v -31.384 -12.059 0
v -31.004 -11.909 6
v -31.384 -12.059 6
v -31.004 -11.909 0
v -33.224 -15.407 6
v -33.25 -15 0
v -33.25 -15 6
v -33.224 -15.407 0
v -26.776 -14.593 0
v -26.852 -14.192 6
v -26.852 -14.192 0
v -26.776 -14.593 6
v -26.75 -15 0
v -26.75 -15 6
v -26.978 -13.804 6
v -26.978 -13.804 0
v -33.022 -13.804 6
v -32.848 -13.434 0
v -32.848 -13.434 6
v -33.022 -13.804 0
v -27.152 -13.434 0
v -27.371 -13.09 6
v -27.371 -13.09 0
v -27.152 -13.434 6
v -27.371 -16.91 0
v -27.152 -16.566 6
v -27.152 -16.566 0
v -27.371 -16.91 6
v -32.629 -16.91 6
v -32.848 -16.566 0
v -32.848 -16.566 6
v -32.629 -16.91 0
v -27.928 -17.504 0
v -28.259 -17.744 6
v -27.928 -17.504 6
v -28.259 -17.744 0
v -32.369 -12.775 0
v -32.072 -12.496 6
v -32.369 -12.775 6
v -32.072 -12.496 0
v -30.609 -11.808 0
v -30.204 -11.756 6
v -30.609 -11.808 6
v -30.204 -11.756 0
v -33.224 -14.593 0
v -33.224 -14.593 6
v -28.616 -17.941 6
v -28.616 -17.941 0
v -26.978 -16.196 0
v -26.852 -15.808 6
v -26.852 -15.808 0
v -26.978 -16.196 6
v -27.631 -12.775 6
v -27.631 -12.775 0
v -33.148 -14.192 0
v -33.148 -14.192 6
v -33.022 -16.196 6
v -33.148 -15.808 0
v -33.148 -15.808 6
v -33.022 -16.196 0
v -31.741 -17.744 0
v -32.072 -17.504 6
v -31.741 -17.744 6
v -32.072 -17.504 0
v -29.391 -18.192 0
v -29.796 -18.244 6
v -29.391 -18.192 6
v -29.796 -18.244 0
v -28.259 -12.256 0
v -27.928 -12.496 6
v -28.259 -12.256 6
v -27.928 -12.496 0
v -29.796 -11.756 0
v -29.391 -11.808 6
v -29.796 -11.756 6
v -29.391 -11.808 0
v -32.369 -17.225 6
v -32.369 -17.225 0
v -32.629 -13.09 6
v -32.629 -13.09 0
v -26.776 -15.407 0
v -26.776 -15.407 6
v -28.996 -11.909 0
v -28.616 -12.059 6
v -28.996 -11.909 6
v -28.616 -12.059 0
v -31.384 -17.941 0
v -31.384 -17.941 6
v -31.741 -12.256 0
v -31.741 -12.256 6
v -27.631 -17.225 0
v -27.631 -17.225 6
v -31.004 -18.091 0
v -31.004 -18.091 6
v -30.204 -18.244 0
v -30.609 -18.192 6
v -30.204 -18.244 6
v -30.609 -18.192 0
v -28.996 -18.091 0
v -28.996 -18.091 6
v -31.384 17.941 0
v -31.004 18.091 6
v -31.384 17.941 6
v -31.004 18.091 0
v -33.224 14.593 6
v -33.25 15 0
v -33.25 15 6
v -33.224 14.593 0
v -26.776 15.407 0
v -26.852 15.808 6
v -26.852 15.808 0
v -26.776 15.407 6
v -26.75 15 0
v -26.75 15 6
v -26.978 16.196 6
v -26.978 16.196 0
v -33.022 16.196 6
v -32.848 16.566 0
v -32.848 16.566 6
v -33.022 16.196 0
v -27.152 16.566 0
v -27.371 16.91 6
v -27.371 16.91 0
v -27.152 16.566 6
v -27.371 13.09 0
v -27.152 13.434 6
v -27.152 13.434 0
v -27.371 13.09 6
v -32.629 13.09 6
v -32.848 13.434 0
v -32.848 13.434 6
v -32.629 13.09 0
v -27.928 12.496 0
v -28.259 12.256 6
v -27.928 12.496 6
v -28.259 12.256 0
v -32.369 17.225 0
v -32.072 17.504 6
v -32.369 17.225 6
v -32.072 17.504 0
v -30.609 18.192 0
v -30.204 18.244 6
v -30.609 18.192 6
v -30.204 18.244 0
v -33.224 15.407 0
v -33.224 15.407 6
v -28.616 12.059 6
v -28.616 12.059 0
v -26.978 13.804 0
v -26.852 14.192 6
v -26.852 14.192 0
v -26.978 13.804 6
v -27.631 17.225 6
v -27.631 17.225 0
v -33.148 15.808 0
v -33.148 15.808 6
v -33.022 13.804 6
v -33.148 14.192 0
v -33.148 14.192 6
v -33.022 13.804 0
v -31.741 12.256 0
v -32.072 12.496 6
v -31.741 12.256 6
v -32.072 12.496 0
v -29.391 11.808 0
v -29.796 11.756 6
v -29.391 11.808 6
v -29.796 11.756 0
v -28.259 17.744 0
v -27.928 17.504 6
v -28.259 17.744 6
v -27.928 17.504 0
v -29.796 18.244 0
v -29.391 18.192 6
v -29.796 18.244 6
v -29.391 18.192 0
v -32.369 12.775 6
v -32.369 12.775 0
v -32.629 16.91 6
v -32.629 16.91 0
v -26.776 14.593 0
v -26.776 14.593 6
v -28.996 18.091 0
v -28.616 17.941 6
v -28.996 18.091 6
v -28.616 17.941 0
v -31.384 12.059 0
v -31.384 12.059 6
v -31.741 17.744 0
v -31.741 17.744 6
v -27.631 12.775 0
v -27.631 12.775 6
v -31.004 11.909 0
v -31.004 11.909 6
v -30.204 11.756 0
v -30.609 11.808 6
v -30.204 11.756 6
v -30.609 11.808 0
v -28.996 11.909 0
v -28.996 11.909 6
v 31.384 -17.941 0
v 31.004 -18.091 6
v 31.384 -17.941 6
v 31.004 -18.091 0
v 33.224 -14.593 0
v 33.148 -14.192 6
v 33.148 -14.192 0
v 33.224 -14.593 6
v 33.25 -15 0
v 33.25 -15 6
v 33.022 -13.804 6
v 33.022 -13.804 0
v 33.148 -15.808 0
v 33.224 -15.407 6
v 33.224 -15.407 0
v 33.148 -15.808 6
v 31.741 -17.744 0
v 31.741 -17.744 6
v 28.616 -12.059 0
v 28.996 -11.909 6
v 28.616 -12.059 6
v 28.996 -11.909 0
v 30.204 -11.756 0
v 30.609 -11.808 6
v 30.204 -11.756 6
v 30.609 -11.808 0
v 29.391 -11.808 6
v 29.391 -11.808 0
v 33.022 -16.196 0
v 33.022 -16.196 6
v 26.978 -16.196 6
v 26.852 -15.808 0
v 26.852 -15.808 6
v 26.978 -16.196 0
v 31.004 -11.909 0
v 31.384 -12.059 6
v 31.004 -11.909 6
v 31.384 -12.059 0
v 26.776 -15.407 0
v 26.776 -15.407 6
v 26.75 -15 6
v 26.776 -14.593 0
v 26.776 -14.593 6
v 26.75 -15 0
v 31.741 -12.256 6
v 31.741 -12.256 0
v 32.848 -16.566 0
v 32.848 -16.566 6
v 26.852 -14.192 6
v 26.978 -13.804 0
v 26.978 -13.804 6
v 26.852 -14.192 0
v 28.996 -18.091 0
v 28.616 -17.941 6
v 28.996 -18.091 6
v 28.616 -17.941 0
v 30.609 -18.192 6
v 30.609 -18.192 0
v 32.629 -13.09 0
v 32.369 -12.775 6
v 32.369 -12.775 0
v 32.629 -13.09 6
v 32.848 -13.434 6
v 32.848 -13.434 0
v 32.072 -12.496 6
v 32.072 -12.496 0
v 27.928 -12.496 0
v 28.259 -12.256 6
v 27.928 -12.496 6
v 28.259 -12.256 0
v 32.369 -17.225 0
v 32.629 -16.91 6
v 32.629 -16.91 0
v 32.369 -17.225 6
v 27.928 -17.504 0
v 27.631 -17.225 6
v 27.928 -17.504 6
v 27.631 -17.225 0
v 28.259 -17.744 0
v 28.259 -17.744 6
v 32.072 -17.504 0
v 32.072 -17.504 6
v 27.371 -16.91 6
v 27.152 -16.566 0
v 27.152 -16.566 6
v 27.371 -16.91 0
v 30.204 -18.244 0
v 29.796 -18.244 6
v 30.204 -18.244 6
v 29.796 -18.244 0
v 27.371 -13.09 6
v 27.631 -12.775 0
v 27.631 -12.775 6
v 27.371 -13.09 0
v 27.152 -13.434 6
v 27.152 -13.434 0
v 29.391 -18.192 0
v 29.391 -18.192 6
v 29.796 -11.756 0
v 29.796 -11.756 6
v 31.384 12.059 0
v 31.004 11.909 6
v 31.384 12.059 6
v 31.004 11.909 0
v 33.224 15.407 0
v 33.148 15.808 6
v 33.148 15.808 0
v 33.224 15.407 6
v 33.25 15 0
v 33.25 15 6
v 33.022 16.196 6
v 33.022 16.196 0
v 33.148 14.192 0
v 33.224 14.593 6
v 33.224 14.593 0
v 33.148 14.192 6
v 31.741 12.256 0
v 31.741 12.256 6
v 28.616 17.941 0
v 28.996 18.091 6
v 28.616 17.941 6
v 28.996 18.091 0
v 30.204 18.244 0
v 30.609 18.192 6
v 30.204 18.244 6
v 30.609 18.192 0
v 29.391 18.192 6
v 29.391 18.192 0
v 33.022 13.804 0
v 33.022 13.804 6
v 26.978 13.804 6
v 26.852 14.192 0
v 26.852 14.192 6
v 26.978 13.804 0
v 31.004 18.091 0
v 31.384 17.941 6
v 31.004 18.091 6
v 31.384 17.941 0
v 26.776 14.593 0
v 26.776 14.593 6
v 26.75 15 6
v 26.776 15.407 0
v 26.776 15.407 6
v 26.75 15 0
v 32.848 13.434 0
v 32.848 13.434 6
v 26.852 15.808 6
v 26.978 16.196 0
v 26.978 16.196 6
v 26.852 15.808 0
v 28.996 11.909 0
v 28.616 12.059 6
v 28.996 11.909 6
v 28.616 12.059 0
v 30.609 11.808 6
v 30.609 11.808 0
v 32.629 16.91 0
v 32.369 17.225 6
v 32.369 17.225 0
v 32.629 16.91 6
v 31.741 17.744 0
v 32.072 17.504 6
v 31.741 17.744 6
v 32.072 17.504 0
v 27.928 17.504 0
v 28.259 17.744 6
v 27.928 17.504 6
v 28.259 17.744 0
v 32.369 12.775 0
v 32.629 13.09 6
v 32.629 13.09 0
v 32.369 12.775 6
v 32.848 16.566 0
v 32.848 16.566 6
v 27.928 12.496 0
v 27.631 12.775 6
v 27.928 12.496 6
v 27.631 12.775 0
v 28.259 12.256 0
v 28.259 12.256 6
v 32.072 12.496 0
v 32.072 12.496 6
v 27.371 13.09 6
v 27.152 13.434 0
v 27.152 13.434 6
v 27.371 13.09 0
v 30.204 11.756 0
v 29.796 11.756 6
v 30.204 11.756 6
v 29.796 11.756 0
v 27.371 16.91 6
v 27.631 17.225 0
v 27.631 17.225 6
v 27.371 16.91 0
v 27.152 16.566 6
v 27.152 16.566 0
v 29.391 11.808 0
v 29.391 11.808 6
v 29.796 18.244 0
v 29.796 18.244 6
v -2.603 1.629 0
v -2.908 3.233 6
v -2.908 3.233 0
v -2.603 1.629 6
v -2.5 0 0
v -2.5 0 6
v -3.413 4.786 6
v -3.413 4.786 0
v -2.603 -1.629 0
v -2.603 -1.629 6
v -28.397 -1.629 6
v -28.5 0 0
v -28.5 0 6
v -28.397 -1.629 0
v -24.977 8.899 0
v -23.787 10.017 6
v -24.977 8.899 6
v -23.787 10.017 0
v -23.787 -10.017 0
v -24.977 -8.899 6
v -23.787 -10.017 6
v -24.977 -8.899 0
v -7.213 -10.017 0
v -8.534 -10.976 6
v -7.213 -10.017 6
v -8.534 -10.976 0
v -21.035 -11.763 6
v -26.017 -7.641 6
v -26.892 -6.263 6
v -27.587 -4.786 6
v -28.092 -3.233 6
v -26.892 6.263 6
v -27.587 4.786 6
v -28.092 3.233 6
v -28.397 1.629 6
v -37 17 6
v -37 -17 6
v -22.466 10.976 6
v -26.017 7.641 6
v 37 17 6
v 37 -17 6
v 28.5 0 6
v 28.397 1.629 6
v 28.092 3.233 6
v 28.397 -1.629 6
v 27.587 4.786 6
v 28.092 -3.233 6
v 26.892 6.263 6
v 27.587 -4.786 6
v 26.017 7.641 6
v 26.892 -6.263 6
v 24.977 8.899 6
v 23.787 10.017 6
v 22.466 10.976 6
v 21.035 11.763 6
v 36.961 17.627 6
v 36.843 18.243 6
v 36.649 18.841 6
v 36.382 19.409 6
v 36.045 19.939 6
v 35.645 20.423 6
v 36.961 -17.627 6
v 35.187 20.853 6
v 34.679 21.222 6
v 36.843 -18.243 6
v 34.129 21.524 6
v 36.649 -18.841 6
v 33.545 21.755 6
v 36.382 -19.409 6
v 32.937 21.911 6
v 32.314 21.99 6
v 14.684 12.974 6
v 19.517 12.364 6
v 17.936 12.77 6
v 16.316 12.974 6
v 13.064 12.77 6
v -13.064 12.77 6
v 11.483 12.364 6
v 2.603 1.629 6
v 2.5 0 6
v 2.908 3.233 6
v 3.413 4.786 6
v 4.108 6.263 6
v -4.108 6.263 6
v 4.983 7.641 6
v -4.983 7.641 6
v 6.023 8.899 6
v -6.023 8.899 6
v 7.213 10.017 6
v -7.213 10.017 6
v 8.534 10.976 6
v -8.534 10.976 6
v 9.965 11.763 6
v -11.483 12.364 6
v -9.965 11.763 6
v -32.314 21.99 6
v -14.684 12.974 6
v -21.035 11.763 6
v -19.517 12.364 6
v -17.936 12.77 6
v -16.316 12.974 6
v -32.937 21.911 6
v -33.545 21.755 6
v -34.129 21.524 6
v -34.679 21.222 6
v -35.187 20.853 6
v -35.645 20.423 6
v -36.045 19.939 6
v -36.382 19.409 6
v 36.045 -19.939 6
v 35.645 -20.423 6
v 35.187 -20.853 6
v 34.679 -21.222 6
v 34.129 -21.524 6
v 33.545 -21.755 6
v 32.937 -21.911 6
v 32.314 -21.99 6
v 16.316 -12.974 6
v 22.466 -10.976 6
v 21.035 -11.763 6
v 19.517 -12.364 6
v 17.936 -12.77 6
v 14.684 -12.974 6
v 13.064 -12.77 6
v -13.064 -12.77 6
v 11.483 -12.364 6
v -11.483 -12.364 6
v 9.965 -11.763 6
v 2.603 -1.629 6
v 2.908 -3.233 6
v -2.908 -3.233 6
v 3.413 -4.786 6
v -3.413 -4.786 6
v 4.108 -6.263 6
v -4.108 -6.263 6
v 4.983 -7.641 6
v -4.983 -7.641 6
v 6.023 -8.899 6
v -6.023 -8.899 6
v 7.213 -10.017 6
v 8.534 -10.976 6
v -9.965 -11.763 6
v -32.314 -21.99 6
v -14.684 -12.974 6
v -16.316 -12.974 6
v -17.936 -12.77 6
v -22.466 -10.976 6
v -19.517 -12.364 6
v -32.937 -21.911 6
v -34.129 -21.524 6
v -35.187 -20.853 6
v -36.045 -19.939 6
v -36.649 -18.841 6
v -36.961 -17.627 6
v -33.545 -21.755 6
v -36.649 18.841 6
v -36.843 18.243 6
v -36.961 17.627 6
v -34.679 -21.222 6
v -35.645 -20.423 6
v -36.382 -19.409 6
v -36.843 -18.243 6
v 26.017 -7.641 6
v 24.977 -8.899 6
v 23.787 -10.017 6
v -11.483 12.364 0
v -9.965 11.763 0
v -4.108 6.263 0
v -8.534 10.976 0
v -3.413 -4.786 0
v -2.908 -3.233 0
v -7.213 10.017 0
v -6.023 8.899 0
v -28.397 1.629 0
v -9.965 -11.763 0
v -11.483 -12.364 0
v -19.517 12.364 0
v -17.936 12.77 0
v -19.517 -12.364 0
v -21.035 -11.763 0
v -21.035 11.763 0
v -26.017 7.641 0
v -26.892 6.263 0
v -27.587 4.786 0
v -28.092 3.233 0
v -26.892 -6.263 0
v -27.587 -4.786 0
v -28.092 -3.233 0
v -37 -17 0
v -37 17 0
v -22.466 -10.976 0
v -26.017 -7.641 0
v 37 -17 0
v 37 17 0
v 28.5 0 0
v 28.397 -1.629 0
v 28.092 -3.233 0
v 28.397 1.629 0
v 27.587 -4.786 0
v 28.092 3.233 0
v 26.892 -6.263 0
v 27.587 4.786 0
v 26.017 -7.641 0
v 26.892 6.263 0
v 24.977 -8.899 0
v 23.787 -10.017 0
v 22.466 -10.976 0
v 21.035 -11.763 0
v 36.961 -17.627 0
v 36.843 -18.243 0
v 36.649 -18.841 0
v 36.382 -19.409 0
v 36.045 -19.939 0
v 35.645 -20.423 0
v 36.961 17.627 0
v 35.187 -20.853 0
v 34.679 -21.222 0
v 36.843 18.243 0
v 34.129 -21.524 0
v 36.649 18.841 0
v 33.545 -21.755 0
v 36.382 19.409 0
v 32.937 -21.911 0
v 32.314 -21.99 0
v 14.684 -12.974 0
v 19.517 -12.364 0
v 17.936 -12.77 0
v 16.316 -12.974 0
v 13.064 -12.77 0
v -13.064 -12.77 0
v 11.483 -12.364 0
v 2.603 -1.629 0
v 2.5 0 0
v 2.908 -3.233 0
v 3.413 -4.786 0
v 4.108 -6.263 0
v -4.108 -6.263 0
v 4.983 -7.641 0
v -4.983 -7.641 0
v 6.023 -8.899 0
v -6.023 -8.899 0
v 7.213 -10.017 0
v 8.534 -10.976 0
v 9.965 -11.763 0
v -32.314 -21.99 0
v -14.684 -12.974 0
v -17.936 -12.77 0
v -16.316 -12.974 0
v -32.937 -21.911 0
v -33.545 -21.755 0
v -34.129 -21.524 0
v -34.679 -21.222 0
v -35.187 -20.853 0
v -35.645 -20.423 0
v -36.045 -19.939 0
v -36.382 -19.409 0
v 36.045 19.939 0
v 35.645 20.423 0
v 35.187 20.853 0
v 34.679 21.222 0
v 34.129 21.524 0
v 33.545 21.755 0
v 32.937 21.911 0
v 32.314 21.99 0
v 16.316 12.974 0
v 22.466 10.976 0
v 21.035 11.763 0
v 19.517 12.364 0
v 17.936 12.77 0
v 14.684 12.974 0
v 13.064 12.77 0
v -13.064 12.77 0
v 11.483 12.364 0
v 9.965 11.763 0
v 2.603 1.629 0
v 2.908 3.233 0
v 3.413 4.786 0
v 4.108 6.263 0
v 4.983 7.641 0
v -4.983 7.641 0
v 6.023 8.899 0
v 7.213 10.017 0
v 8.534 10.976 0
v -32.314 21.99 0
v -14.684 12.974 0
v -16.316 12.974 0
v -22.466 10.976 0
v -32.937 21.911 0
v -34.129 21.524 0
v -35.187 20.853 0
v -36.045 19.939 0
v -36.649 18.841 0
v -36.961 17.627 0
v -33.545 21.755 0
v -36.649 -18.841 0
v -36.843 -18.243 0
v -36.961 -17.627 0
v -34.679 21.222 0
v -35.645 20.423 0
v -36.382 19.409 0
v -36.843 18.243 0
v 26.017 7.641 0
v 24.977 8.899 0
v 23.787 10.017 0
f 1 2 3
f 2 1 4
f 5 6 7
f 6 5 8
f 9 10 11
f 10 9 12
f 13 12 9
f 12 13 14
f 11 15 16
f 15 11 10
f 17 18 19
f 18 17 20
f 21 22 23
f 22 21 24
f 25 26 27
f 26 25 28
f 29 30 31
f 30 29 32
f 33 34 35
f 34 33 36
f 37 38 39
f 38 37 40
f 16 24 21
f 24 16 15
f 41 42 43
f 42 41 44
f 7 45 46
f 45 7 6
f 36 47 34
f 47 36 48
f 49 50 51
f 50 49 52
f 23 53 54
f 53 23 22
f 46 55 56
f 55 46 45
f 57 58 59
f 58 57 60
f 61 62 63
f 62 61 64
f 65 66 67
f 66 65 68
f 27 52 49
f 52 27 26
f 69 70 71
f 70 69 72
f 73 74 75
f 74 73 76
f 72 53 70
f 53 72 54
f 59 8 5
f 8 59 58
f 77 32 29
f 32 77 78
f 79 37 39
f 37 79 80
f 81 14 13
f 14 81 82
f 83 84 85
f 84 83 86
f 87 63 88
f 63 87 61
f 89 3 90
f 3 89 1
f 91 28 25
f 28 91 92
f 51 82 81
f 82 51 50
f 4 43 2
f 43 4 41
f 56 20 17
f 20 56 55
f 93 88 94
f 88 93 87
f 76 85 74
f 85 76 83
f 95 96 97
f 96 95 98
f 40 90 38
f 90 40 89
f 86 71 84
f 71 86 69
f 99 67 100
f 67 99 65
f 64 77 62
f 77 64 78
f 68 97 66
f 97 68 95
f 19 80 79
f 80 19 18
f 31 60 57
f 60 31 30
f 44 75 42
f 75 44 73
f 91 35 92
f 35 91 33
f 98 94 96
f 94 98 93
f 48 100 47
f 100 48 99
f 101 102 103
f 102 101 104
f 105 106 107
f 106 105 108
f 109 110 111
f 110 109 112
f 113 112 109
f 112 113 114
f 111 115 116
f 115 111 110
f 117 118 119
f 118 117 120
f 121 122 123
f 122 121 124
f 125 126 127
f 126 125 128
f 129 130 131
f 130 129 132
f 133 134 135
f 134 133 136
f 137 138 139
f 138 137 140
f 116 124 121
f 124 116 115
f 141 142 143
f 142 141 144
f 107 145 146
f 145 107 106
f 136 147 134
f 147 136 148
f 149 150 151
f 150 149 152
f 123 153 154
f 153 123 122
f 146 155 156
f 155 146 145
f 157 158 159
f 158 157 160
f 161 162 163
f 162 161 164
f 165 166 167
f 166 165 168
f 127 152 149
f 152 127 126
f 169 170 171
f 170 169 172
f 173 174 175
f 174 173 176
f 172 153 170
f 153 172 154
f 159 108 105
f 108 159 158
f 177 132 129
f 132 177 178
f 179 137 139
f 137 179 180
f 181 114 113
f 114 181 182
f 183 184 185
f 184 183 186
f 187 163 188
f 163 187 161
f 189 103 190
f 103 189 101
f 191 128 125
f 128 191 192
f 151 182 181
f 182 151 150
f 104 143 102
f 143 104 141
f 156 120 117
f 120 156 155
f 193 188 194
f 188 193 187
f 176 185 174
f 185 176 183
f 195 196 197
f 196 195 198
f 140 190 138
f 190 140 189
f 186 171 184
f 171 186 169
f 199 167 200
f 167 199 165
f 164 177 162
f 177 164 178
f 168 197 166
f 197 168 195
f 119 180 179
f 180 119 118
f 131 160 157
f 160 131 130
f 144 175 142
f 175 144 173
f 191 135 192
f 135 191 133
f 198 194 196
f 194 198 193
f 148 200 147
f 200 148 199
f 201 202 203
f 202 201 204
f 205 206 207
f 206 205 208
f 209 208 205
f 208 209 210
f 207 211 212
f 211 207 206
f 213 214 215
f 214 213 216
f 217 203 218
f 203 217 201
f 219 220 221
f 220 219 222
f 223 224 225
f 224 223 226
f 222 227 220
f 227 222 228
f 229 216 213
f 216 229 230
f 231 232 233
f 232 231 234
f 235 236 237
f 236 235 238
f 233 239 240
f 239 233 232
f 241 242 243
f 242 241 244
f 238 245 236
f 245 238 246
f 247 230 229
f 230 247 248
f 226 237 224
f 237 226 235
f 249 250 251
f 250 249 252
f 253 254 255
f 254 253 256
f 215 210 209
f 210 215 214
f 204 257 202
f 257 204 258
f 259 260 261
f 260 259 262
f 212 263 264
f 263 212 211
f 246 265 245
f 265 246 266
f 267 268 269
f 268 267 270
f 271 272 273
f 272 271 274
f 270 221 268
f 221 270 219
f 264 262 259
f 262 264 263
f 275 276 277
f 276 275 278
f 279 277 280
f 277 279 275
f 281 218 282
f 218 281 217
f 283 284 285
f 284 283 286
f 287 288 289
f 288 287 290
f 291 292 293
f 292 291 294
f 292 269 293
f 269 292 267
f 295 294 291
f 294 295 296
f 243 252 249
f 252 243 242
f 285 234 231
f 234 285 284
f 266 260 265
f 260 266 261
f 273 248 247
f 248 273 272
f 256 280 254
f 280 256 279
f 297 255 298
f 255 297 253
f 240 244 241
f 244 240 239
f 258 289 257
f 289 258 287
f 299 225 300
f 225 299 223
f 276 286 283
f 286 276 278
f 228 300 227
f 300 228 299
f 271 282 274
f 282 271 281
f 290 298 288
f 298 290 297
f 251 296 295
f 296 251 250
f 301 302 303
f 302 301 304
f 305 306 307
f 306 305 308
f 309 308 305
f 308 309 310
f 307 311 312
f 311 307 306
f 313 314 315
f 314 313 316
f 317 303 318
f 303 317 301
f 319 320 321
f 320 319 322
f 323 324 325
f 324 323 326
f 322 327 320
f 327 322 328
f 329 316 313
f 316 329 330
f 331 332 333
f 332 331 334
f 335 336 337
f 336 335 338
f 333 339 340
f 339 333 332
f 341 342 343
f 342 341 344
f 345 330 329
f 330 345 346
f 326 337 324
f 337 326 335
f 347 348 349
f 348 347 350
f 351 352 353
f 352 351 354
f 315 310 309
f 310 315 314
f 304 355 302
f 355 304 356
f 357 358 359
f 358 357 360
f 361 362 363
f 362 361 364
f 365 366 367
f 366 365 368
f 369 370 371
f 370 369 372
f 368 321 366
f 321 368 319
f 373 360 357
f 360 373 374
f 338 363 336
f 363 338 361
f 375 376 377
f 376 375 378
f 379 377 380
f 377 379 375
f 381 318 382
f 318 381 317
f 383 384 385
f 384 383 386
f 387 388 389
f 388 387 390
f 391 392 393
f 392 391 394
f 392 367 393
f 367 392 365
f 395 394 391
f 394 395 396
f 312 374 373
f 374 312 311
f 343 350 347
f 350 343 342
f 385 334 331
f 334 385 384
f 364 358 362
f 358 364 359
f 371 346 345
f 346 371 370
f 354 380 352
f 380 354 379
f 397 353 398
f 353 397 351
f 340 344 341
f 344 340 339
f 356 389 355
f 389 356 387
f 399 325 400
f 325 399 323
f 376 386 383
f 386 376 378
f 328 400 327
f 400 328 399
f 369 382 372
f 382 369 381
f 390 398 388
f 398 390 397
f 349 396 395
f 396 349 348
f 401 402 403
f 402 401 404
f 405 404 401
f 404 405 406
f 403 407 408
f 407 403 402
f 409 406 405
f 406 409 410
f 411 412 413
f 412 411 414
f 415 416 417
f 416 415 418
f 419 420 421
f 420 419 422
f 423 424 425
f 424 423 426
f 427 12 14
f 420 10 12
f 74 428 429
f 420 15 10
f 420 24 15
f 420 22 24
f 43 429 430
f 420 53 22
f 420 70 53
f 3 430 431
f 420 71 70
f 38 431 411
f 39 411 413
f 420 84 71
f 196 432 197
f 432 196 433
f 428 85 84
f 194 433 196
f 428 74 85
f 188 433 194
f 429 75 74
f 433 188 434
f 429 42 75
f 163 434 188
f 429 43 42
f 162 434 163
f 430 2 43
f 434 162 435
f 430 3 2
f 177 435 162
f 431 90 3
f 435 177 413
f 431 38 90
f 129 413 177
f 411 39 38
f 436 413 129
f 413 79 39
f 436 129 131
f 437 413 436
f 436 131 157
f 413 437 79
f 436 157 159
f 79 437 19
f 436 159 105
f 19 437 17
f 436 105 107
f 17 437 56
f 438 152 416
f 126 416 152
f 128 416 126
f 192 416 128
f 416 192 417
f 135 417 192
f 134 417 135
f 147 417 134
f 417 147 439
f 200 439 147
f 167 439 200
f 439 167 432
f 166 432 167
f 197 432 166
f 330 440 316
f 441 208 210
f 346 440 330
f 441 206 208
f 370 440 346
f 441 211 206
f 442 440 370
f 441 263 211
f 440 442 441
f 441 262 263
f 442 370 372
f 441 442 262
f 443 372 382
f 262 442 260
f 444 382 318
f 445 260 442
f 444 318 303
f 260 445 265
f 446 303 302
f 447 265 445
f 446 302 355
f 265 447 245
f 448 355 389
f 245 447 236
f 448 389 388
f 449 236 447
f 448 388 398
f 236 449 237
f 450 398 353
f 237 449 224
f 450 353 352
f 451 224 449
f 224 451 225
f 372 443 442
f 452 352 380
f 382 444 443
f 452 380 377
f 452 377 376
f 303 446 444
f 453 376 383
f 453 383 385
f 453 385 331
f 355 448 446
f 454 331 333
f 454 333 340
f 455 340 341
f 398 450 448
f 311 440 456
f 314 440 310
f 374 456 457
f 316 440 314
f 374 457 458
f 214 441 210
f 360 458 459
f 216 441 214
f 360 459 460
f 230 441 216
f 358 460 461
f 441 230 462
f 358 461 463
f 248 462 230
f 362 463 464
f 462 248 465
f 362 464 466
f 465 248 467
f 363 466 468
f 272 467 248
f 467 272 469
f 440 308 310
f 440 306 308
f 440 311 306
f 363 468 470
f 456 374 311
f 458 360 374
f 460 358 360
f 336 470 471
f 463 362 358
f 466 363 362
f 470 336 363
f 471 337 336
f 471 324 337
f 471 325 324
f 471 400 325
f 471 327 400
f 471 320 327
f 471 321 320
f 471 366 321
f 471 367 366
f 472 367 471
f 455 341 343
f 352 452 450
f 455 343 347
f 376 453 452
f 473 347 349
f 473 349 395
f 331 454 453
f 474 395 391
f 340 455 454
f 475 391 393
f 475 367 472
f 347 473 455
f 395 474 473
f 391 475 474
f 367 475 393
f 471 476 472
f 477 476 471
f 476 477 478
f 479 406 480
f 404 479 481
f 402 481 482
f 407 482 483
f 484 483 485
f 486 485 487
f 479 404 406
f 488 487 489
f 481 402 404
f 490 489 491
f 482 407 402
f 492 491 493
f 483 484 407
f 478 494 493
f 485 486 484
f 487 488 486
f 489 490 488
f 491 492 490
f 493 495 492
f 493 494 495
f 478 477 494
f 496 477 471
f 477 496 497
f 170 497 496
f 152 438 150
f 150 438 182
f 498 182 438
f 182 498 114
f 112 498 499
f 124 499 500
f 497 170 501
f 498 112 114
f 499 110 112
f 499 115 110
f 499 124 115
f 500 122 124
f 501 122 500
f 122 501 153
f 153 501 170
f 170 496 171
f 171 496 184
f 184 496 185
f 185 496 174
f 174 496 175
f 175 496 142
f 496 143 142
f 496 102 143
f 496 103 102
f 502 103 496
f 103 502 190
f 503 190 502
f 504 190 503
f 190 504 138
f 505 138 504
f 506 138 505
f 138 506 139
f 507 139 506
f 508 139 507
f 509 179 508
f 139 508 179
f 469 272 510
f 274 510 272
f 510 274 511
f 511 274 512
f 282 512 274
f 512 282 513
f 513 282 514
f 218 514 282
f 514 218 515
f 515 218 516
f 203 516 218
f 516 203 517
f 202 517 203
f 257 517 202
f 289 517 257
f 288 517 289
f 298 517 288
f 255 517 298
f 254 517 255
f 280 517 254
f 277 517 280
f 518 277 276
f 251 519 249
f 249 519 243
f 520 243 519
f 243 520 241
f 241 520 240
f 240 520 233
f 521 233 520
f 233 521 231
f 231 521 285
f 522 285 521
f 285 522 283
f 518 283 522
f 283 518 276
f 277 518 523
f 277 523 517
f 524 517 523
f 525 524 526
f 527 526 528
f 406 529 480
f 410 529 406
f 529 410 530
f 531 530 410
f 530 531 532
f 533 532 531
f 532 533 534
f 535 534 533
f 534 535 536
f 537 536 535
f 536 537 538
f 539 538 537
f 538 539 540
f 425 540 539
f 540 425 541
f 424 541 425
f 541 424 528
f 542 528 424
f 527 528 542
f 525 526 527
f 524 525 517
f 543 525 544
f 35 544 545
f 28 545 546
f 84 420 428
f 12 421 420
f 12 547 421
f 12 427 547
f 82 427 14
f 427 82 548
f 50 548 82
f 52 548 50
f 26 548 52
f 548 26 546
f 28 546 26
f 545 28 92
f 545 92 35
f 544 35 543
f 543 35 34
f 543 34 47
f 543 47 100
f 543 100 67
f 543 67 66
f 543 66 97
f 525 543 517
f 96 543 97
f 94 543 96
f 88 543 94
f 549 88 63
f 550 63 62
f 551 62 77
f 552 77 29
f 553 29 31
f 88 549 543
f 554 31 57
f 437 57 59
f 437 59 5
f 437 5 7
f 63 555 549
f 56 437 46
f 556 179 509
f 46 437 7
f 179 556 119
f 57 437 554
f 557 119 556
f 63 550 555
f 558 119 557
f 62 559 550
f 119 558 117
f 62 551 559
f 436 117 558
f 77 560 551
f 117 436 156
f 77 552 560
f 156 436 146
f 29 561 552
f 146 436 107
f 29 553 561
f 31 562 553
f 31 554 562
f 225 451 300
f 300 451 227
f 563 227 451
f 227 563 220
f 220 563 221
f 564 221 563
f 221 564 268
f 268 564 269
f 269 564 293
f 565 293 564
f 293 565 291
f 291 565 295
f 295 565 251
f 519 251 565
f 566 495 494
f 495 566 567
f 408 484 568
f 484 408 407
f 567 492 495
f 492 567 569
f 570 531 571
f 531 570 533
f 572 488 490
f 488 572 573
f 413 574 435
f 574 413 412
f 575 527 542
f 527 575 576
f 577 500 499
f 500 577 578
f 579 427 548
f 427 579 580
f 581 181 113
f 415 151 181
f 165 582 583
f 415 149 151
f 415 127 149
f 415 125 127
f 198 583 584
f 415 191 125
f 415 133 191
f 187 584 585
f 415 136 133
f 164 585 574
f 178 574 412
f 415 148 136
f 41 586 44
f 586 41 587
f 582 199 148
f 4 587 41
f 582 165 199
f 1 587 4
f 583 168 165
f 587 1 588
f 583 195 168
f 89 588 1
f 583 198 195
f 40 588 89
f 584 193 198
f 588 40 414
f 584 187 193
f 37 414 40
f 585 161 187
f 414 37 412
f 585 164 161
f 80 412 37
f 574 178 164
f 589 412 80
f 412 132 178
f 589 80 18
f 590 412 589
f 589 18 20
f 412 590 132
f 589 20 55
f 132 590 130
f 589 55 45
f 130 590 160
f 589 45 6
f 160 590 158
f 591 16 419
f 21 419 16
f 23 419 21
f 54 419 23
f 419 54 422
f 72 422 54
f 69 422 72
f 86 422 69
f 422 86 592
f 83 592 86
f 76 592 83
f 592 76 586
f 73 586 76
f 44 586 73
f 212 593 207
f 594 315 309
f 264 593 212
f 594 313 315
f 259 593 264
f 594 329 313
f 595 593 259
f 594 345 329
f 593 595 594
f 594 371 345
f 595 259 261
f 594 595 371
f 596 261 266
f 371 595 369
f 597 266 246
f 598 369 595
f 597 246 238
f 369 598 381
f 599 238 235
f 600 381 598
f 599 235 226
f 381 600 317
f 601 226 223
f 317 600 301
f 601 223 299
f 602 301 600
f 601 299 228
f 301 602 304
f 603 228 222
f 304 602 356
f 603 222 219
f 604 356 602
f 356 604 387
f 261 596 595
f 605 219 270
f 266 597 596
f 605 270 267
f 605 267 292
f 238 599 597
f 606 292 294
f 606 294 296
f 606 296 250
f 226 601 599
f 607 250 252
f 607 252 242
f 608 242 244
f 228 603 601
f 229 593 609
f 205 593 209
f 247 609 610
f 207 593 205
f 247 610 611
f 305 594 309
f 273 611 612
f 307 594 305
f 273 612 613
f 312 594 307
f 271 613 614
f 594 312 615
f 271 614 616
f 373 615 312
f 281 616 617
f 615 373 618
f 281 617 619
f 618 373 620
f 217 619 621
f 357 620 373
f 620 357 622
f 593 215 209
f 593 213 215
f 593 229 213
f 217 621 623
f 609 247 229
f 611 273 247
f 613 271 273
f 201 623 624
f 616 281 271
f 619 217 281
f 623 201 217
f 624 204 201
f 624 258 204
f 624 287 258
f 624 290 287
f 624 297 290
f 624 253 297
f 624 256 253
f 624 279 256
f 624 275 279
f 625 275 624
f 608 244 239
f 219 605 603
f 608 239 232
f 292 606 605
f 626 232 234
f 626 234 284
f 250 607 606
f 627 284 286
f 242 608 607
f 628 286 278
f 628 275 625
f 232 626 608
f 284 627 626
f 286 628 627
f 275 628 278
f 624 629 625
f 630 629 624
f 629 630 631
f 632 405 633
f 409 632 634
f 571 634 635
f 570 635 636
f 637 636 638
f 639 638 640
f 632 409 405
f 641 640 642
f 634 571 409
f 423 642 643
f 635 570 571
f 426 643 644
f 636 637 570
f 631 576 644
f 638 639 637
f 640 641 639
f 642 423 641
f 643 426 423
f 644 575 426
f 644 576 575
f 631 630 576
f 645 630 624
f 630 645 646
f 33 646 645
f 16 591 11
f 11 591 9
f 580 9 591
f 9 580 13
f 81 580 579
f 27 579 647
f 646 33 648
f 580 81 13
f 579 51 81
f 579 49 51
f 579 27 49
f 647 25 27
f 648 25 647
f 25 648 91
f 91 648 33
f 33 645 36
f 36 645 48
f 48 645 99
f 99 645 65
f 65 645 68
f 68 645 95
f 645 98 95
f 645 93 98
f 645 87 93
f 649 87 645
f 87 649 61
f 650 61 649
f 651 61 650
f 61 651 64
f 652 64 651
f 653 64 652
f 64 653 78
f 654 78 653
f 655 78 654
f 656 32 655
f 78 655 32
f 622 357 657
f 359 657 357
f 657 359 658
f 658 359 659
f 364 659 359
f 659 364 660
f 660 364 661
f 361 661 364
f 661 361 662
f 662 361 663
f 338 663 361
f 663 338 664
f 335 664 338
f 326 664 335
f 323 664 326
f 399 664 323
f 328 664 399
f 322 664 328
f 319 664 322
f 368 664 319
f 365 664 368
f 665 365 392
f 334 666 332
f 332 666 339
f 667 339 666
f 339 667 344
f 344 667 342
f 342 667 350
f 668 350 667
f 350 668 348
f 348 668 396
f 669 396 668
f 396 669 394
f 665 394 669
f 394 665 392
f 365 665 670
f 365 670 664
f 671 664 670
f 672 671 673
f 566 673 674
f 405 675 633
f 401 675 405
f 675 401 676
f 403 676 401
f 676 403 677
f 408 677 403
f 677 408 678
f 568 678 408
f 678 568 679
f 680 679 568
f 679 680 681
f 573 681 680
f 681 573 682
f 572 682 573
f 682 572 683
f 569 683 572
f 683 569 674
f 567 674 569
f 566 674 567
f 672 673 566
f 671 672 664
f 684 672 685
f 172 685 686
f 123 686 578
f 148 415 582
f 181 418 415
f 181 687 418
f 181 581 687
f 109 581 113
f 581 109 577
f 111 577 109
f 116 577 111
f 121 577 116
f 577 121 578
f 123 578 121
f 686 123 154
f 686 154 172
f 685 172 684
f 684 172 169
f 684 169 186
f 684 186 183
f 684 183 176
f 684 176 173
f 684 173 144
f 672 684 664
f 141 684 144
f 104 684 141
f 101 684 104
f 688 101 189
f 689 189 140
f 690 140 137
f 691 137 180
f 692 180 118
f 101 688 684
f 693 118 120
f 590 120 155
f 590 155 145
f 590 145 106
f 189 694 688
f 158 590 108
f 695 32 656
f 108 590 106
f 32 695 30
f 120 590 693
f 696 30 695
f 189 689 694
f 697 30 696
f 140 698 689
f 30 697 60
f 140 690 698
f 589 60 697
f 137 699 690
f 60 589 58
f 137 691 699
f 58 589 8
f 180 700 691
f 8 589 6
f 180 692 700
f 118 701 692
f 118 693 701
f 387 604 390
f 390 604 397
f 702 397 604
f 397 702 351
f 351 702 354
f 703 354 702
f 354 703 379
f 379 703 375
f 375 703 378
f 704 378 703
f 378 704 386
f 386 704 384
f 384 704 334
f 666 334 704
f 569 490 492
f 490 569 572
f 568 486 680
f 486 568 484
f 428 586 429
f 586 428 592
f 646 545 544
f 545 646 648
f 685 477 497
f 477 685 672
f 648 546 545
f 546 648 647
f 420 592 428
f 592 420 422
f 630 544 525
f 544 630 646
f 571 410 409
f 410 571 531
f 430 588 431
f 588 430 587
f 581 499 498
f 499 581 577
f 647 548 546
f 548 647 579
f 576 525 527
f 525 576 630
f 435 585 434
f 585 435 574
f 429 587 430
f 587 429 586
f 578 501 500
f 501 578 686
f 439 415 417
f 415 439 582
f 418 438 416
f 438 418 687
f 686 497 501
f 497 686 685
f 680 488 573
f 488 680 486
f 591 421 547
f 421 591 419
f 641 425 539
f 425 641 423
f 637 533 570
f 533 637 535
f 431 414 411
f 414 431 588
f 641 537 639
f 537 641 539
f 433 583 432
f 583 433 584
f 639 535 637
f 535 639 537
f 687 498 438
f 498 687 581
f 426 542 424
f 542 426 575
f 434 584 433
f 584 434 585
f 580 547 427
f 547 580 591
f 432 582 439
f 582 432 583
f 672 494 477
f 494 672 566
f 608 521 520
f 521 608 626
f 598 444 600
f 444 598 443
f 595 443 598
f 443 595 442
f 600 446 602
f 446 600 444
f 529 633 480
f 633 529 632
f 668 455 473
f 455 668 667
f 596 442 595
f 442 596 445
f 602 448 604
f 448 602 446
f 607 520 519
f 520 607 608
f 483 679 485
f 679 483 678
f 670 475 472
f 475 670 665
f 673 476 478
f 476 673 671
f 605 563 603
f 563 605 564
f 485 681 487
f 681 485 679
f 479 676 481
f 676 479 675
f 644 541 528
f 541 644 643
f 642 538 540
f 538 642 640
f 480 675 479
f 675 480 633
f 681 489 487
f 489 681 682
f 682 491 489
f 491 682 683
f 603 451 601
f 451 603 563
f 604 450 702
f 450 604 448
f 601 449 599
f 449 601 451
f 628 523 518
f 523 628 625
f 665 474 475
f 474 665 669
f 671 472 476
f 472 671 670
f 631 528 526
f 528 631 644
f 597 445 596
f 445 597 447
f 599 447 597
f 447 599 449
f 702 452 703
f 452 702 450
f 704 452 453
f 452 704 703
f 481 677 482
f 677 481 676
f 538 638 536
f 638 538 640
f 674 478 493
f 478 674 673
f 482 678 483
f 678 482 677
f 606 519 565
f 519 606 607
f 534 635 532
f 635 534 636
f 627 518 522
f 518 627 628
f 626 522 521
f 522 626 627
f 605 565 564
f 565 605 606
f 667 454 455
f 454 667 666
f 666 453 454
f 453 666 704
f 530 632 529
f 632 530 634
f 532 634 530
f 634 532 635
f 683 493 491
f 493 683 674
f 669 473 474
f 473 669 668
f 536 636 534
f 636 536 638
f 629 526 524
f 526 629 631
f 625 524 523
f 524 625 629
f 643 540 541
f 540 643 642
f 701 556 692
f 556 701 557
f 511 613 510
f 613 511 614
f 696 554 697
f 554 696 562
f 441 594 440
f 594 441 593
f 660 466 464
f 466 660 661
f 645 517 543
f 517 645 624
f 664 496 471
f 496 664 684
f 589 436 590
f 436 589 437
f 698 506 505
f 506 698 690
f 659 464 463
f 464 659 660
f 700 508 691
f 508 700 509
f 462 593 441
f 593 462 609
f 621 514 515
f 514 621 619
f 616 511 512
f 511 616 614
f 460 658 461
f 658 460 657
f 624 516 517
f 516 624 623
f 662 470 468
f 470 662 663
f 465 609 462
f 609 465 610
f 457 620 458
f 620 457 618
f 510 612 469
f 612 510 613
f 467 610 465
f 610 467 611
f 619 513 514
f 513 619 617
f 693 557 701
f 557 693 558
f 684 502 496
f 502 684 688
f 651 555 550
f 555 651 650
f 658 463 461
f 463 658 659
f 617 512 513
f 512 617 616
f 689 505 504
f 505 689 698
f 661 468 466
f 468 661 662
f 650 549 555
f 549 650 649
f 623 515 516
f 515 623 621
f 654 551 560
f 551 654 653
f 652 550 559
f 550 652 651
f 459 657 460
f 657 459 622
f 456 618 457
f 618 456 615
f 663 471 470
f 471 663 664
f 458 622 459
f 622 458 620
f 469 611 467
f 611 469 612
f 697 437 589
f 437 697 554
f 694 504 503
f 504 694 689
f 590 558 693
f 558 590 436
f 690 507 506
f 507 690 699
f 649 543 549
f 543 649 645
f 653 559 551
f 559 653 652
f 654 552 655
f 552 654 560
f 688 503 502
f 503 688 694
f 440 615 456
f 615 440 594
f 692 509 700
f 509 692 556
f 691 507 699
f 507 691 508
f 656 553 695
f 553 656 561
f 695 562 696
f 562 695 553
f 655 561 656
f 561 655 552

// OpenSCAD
$fn = 50;


difference() {
	union() {
		hull() {
			translate(v = [-32.0000000000, 17.0000000000, 0]) {
				cylinder(h = 6, r = 5);
			}
			translate(v = [32.0000000000, 17.0000000000, 0]) {
				cylinder(h = 6, r = 5);
			}
			translate(v = [-32.0000000000, -17.0000000000, 0]) {
				cylinder(h = 6, r = 5);
			}
			translate(v = [32.0000000000, -17.0000000000, 0]) {
				cylinder(h = 6, r = 5);
			}
		}
	}
	union() {
		#translate(v = [-30.0000000000, -15.0000000000, -100.0000000000]) {
			cylinder(h = 200, r = 3.2500000000);
		}
		#translate(v = [-30.0000000000, 15.0000000000, -100.0000000000]) {
			cylinder(h = 200, r = 3.2500000000);
		}
		#translate(v = [30.0000000000, -15.0000000000, -100.0000000000]) {
			cylinder(h = 200, r = 3.2500000000);
		}
		#translate(v = [30.0000000000, 15.0000000000, -100.0000000000]) {
			cylinder(h = 200, r = 3.2500000000);
		}
		#translate(v = [-15.5000000000, 0, 0]) {
			cylinder(h = 6, r = 13.0000000000);
		}
		#translate(v = [15.5000000000, 0, 0]) {
			cylinder(h = 6, r = 13.0000000000);
		}
	}
}
